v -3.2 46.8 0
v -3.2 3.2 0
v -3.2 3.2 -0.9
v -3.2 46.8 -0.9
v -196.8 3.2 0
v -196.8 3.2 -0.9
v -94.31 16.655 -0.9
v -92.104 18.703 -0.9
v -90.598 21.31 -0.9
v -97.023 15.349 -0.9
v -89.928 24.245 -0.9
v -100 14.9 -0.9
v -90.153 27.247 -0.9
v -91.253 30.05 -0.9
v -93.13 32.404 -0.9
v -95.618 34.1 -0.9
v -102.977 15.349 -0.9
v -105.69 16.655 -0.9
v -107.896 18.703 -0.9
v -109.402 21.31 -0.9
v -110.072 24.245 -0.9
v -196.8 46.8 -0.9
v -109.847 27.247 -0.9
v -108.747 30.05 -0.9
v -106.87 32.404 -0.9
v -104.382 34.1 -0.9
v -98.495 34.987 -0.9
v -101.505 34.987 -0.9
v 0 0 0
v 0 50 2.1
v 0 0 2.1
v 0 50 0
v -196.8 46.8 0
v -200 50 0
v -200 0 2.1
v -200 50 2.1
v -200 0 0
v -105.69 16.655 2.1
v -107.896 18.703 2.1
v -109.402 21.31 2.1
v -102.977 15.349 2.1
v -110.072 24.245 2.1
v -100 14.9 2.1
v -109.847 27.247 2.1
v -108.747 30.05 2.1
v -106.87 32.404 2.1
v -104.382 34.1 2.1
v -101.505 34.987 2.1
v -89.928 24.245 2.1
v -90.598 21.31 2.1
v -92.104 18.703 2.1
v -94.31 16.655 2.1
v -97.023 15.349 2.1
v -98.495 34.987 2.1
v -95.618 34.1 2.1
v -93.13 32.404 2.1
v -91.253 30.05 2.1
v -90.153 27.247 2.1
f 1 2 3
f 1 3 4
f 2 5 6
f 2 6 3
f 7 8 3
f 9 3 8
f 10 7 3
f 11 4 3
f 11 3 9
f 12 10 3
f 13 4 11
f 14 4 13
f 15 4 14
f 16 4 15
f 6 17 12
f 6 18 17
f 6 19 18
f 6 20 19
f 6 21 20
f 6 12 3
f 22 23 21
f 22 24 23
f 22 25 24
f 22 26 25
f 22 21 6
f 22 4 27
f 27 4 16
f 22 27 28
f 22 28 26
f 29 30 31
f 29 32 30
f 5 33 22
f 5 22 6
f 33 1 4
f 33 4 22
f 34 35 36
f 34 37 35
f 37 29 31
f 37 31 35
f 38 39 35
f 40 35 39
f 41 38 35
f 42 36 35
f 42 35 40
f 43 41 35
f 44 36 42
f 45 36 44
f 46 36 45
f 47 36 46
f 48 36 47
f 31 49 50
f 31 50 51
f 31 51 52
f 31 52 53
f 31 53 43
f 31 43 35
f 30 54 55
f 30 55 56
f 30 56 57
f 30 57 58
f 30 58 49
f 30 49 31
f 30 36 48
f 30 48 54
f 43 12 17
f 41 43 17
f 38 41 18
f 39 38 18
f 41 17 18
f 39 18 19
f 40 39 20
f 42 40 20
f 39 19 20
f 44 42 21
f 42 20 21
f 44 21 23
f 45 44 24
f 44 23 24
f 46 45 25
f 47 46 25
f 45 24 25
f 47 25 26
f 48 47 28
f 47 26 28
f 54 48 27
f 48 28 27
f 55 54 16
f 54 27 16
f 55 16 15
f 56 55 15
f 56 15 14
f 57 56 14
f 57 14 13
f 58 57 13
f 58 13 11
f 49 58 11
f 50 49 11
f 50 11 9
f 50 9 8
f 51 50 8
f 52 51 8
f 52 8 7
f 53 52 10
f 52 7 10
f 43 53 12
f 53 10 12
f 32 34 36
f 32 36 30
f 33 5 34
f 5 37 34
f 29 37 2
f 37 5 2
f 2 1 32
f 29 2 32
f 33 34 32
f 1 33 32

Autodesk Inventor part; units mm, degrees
ref_plane "YZ Plane" through (0, 0, 0) normal (1, 0, 0) x (0, 1, 0)
ref_plane "XZ Plane" through (0, 0, 0) normal (0, 1, 0) x (-1, 0, 0)
ref_plane "XY Plane" through (0, 0, 0) normal (0, 0, 1) x (1, 0, 0)
sketch "Sketch1" plane through (0, 0, 0) normal (0, 0, 1) x (1, 0, 0)
  line L0 (0, 0) -> (-200, 0)
  line L1 (-200, 0) -> (-200, 50)
  line L2 (-200, 50) -> (0, 50)
  line L3 (0, 50) -> (0, 0)
  dimension "d0" = 200
  dimension "d1" = 50
extrude "Cuerpo" add sketch "Sketch1" along normal blind 2.1
sketch "Sketch2" plane through (0, 0, 0) normal (0, 0, -1) x (-1, 0, 0)
  line L0 (0, 0) -> (200, 0) projected
  line L1 (200, 0) -> (200, 50) projected
  line L2 (200, 50) -> (0, 50) projected
  line L3 (0, 50) -> (0, 0) projected
  line L4 (0, 0) -> (200, 0) projected
  line L5 (200, 0) -> (200, 50) projected
  line L6 (200, 50) -> (0, 50) projected
  line L7 (0, 50) -> (0, 0) projected
  line L8 (196.8, 3.2) -> (3.2, 3.2)
  line L9 (3.2, 3.2) -> (3.2, 46.8)
  line L10 (3.2, 46.8) -> (196.8, 46.8)
  line L11 (196.8, 46.8) -> (196.8, 3.2)
  dimension "d4" = 3.2
extrude "Ranura" add sketch "Sketch2" along normal blind 0.9 contours L8 L9 L10 L11
sketch "Sketch4" plane through (0, 0, 2.1) normal (0, 0, 1) x (1, 0, 0)
  line L0 (-200, 50) -> (0, 50) projected
  line L1 (-100, 50) -> (-100, 0)
  line L2 (-200, 0) -> (0, 0) projected
  point P0 (-100, 25)
hole "Rueda Externa" at (-100, 25, 2.1) direction (0, 0, -1) diameter 20.2 end through all
equation "\"d0\" = base_largo"
equation "\"d1\" = base_ancho"
equation "\"d2\" = tapa_grosor"
equation "\"d4\" = base_muros_grosor + general_margen"
equation "\"d5\" = tapa_ranura"
equation "\"d8\" = tapa_eje_diametro"
equation "\"base_largo\" = 200"
equation "\"base_ancho\" = 50"
equation "\"tapa_grosor\" = 2.1"
equation "\"base_muros_grosor\" = 3"
equation "\"general_margen\" = 0.2"
equation "\"tapa_ranura\" = 0.9"
equation "\"tapa_eje_diametro\" = 20.2"
properties part number "Tapa"
